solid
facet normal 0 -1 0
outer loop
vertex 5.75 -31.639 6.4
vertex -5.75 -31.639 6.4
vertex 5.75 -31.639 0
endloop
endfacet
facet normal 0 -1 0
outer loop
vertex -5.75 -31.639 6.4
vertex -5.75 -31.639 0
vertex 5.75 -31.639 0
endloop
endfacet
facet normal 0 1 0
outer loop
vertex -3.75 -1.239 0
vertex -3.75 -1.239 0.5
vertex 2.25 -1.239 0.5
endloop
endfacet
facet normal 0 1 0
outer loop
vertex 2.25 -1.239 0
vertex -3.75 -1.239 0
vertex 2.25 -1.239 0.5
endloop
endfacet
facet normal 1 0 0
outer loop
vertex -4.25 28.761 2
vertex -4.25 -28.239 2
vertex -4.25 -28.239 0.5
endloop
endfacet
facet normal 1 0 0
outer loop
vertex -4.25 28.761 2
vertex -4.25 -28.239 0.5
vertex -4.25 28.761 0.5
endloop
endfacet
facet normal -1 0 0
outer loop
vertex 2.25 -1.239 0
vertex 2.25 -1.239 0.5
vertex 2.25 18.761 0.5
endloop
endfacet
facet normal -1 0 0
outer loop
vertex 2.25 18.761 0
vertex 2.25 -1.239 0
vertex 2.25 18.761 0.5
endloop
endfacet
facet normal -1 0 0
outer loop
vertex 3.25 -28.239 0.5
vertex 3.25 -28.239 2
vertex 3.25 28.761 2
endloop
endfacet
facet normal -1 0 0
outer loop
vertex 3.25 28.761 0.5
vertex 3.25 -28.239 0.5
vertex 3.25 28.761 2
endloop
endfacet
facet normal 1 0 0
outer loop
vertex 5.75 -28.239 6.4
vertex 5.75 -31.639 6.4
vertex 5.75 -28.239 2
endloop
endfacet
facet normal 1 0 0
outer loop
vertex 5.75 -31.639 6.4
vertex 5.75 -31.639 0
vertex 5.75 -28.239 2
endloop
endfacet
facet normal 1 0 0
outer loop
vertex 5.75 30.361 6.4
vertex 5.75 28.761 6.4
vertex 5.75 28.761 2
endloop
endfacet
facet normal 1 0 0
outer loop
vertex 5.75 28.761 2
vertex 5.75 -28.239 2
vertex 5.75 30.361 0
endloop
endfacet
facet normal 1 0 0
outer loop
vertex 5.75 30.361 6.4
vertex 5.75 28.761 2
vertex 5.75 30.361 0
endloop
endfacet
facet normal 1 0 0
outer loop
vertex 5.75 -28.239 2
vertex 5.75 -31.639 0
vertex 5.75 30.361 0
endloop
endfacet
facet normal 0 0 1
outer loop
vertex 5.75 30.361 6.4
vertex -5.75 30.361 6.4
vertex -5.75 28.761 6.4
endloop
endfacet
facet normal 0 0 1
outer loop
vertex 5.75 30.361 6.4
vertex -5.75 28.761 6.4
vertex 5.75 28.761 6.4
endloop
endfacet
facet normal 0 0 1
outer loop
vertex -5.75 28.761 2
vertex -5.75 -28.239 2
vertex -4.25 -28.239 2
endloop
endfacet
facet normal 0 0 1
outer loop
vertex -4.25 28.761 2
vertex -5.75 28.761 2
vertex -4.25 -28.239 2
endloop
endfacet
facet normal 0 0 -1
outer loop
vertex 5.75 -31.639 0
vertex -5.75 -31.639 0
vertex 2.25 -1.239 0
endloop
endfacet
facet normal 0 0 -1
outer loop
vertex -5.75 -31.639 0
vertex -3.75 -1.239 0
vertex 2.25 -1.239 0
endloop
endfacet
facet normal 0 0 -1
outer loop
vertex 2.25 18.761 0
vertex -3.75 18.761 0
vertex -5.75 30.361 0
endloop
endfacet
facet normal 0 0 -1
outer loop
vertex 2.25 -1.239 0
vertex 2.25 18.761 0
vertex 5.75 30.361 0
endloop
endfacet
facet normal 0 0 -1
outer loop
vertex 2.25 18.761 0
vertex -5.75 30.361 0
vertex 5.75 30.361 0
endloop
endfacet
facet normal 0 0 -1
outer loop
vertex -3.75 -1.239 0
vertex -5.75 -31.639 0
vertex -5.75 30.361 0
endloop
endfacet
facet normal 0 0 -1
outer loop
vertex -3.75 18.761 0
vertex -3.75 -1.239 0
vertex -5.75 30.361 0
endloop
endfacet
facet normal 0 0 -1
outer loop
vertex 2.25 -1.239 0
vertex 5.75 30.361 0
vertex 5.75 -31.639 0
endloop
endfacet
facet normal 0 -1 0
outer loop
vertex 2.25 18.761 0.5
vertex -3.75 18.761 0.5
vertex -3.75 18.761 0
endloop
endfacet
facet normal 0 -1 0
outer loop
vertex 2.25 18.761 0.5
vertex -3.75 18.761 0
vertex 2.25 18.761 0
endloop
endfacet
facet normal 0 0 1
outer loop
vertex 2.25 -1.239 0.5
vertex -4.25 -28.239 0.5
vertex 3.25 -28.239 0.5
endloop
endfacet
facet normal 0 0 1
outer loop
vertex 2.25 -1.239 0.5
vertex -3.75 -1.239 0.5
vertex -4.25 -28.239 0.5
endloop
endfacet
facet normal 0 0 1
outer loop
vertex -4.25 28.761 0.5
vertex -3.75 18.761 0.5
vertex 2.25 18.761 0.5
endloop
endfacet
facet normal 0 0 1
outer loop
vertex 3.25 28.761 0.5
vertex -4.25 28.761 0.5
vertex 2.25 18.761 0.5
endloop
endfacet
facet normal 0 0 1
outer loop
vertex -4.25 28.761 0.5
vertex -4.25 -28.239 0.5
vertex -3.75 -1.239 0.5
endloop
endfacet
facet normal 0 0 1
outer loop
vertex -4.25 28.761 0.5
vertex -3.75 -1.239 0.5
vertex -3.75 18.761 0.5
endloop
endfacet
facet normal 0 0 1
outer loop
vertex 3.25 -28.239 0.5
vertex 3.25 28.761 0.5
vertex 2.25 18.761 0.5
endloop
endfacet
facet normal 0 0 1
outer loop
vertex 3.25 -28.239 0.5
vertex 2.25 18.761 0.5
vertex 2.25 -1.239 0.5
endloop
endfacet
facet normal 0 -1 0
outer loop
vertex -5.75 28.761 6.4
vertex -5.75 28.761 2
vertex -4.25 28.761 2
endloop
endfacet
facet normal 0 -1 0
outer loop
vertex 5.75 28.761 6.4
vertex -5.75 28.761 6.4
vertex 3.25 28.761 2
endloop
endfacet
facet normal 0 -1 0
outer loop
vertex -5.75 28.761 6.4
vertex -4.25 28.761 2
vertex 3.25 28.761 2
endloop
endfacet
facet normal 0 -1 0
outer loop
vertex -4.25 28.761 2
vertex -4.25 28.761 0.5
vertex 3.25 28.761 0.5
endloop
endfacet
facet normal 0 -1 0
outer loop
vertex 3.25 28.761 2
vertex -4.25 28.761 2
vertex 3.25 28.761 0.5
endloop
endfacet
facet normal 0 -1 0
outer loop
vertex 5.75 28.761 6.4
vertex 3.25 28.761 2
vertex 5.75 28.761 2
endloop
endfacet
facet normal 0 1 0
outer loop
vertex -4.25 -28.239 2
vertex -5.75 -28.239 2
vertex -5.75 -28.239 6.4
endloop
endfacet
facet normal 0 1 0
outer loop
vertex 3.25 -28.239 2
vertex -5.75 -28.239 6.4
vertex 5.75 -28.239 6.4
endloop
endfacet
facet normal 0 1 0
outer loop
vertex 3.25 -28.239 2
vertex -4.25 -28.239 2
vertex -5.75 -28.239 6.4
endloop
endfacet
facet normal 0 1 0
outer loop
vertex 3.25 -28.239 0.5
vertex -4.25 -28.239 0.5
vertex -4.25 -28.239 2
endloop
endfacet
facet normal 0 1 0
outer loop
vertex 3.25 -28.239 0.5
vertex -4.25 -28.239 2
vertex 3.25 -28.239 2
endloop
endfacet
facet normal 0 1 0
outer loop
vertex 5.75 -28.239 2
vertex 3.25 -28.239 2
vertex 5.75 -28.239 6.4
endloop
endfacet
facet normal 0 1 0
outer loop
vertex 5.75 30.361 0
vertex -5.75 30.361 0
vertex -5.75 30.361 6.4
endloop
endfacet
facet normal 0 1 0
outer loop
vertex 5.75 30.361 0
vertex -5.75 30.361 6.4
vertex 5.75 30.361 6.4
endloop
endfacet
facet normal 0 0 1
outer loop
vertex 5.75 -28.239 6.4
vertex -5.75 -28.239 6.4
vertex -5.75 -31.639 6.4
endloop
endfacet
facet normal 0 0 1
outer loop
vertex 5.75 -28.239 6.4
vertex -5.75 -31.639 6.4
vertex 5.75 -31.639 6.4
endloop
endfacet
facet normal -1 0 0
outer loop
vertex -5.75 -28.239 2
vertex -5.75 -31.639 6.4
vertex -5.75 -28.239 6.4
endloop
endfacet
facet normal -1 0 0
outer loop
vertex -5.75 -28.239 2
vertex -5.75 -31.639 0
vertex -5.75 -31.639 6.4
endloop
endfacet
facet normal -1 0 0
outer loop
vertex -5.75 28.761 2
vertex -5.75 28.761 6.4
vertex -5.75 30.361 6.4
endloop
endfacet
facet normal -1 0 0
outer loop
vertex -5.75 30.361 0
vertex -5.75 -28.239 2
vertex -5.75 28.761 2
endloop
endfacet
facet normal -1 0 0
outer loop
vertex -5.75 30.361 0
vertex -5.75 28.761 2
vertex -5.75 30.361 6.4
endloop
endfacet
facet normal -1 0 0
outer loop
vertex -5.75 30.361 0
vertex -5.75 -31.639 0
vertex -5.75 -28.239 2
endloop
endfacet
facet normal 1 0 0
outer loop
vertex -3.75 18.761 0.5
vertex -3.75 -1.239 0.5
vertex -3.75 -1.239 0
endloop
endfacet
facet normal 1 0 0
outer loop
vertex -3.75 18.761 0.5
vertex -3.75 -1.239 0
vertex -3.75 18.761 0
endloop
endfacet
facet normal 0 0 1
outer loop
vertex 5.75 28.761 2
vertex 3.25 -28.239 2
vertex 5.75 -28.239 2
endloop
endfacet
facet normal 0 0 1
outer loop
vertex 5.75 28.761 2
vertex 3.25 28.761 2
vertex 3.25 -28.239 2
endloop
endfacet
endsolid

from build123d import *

# Parameters (mm, degrees)
F0_W     = 11.5
F0_H     = 62
F1_DEPTH = 2
F2_W     = 7.5
F2_H     = 57
F3_DEPTH = 1.5
F4_W     = 6
F4_H     = 20
F5_DEPTH = 0.5
F6_W     = 11.5
F6_H     = 3.4
F6_H_2   = 1.6
F7_DEPTH = 4.4


with BuildPart() as f1:
    # F0 (on Top) → F1 (new body)
    with BuildSketch(Plane.XY):
        with Locations((0, -0.639212)):
            Rectangle(F0_W, F0_H)
    extrude(amount=F1_DEPTH)

    # F2 (on face) → F3 (cut)
    with BuildSketch(Plane.XY.offset(2)):
        with Locations((-0.5, 0.260788)):
            Rectangle(F2_W, F2_H)
    extrude(amount=-F3_DEPTH, mode=Mode.SUBTRACT)

    # F4 (on face) → F5 (cut, through all)
    with BuildSketch(Plane.XY.offset(0.5)):
        with Locations((-0.75, 8.760788)):
            Rectangle(F4_W, F4_H)
    extrude(amount=-F5_DEPTH, mode=Mode.SUBTRACT)

    # F6 (on face) → F7 (join)
    with BuildSketch(Plane.XY.offset(2)):
        with Locations((0, -29.939212)):
            Rectangle(F6_W, F6_H)
        with Locations((0, 29.560788)):
            Rectangle(F6_W, F6_H_2)
    extrude(amount=F7_DEPTH)


solid = f1.part
